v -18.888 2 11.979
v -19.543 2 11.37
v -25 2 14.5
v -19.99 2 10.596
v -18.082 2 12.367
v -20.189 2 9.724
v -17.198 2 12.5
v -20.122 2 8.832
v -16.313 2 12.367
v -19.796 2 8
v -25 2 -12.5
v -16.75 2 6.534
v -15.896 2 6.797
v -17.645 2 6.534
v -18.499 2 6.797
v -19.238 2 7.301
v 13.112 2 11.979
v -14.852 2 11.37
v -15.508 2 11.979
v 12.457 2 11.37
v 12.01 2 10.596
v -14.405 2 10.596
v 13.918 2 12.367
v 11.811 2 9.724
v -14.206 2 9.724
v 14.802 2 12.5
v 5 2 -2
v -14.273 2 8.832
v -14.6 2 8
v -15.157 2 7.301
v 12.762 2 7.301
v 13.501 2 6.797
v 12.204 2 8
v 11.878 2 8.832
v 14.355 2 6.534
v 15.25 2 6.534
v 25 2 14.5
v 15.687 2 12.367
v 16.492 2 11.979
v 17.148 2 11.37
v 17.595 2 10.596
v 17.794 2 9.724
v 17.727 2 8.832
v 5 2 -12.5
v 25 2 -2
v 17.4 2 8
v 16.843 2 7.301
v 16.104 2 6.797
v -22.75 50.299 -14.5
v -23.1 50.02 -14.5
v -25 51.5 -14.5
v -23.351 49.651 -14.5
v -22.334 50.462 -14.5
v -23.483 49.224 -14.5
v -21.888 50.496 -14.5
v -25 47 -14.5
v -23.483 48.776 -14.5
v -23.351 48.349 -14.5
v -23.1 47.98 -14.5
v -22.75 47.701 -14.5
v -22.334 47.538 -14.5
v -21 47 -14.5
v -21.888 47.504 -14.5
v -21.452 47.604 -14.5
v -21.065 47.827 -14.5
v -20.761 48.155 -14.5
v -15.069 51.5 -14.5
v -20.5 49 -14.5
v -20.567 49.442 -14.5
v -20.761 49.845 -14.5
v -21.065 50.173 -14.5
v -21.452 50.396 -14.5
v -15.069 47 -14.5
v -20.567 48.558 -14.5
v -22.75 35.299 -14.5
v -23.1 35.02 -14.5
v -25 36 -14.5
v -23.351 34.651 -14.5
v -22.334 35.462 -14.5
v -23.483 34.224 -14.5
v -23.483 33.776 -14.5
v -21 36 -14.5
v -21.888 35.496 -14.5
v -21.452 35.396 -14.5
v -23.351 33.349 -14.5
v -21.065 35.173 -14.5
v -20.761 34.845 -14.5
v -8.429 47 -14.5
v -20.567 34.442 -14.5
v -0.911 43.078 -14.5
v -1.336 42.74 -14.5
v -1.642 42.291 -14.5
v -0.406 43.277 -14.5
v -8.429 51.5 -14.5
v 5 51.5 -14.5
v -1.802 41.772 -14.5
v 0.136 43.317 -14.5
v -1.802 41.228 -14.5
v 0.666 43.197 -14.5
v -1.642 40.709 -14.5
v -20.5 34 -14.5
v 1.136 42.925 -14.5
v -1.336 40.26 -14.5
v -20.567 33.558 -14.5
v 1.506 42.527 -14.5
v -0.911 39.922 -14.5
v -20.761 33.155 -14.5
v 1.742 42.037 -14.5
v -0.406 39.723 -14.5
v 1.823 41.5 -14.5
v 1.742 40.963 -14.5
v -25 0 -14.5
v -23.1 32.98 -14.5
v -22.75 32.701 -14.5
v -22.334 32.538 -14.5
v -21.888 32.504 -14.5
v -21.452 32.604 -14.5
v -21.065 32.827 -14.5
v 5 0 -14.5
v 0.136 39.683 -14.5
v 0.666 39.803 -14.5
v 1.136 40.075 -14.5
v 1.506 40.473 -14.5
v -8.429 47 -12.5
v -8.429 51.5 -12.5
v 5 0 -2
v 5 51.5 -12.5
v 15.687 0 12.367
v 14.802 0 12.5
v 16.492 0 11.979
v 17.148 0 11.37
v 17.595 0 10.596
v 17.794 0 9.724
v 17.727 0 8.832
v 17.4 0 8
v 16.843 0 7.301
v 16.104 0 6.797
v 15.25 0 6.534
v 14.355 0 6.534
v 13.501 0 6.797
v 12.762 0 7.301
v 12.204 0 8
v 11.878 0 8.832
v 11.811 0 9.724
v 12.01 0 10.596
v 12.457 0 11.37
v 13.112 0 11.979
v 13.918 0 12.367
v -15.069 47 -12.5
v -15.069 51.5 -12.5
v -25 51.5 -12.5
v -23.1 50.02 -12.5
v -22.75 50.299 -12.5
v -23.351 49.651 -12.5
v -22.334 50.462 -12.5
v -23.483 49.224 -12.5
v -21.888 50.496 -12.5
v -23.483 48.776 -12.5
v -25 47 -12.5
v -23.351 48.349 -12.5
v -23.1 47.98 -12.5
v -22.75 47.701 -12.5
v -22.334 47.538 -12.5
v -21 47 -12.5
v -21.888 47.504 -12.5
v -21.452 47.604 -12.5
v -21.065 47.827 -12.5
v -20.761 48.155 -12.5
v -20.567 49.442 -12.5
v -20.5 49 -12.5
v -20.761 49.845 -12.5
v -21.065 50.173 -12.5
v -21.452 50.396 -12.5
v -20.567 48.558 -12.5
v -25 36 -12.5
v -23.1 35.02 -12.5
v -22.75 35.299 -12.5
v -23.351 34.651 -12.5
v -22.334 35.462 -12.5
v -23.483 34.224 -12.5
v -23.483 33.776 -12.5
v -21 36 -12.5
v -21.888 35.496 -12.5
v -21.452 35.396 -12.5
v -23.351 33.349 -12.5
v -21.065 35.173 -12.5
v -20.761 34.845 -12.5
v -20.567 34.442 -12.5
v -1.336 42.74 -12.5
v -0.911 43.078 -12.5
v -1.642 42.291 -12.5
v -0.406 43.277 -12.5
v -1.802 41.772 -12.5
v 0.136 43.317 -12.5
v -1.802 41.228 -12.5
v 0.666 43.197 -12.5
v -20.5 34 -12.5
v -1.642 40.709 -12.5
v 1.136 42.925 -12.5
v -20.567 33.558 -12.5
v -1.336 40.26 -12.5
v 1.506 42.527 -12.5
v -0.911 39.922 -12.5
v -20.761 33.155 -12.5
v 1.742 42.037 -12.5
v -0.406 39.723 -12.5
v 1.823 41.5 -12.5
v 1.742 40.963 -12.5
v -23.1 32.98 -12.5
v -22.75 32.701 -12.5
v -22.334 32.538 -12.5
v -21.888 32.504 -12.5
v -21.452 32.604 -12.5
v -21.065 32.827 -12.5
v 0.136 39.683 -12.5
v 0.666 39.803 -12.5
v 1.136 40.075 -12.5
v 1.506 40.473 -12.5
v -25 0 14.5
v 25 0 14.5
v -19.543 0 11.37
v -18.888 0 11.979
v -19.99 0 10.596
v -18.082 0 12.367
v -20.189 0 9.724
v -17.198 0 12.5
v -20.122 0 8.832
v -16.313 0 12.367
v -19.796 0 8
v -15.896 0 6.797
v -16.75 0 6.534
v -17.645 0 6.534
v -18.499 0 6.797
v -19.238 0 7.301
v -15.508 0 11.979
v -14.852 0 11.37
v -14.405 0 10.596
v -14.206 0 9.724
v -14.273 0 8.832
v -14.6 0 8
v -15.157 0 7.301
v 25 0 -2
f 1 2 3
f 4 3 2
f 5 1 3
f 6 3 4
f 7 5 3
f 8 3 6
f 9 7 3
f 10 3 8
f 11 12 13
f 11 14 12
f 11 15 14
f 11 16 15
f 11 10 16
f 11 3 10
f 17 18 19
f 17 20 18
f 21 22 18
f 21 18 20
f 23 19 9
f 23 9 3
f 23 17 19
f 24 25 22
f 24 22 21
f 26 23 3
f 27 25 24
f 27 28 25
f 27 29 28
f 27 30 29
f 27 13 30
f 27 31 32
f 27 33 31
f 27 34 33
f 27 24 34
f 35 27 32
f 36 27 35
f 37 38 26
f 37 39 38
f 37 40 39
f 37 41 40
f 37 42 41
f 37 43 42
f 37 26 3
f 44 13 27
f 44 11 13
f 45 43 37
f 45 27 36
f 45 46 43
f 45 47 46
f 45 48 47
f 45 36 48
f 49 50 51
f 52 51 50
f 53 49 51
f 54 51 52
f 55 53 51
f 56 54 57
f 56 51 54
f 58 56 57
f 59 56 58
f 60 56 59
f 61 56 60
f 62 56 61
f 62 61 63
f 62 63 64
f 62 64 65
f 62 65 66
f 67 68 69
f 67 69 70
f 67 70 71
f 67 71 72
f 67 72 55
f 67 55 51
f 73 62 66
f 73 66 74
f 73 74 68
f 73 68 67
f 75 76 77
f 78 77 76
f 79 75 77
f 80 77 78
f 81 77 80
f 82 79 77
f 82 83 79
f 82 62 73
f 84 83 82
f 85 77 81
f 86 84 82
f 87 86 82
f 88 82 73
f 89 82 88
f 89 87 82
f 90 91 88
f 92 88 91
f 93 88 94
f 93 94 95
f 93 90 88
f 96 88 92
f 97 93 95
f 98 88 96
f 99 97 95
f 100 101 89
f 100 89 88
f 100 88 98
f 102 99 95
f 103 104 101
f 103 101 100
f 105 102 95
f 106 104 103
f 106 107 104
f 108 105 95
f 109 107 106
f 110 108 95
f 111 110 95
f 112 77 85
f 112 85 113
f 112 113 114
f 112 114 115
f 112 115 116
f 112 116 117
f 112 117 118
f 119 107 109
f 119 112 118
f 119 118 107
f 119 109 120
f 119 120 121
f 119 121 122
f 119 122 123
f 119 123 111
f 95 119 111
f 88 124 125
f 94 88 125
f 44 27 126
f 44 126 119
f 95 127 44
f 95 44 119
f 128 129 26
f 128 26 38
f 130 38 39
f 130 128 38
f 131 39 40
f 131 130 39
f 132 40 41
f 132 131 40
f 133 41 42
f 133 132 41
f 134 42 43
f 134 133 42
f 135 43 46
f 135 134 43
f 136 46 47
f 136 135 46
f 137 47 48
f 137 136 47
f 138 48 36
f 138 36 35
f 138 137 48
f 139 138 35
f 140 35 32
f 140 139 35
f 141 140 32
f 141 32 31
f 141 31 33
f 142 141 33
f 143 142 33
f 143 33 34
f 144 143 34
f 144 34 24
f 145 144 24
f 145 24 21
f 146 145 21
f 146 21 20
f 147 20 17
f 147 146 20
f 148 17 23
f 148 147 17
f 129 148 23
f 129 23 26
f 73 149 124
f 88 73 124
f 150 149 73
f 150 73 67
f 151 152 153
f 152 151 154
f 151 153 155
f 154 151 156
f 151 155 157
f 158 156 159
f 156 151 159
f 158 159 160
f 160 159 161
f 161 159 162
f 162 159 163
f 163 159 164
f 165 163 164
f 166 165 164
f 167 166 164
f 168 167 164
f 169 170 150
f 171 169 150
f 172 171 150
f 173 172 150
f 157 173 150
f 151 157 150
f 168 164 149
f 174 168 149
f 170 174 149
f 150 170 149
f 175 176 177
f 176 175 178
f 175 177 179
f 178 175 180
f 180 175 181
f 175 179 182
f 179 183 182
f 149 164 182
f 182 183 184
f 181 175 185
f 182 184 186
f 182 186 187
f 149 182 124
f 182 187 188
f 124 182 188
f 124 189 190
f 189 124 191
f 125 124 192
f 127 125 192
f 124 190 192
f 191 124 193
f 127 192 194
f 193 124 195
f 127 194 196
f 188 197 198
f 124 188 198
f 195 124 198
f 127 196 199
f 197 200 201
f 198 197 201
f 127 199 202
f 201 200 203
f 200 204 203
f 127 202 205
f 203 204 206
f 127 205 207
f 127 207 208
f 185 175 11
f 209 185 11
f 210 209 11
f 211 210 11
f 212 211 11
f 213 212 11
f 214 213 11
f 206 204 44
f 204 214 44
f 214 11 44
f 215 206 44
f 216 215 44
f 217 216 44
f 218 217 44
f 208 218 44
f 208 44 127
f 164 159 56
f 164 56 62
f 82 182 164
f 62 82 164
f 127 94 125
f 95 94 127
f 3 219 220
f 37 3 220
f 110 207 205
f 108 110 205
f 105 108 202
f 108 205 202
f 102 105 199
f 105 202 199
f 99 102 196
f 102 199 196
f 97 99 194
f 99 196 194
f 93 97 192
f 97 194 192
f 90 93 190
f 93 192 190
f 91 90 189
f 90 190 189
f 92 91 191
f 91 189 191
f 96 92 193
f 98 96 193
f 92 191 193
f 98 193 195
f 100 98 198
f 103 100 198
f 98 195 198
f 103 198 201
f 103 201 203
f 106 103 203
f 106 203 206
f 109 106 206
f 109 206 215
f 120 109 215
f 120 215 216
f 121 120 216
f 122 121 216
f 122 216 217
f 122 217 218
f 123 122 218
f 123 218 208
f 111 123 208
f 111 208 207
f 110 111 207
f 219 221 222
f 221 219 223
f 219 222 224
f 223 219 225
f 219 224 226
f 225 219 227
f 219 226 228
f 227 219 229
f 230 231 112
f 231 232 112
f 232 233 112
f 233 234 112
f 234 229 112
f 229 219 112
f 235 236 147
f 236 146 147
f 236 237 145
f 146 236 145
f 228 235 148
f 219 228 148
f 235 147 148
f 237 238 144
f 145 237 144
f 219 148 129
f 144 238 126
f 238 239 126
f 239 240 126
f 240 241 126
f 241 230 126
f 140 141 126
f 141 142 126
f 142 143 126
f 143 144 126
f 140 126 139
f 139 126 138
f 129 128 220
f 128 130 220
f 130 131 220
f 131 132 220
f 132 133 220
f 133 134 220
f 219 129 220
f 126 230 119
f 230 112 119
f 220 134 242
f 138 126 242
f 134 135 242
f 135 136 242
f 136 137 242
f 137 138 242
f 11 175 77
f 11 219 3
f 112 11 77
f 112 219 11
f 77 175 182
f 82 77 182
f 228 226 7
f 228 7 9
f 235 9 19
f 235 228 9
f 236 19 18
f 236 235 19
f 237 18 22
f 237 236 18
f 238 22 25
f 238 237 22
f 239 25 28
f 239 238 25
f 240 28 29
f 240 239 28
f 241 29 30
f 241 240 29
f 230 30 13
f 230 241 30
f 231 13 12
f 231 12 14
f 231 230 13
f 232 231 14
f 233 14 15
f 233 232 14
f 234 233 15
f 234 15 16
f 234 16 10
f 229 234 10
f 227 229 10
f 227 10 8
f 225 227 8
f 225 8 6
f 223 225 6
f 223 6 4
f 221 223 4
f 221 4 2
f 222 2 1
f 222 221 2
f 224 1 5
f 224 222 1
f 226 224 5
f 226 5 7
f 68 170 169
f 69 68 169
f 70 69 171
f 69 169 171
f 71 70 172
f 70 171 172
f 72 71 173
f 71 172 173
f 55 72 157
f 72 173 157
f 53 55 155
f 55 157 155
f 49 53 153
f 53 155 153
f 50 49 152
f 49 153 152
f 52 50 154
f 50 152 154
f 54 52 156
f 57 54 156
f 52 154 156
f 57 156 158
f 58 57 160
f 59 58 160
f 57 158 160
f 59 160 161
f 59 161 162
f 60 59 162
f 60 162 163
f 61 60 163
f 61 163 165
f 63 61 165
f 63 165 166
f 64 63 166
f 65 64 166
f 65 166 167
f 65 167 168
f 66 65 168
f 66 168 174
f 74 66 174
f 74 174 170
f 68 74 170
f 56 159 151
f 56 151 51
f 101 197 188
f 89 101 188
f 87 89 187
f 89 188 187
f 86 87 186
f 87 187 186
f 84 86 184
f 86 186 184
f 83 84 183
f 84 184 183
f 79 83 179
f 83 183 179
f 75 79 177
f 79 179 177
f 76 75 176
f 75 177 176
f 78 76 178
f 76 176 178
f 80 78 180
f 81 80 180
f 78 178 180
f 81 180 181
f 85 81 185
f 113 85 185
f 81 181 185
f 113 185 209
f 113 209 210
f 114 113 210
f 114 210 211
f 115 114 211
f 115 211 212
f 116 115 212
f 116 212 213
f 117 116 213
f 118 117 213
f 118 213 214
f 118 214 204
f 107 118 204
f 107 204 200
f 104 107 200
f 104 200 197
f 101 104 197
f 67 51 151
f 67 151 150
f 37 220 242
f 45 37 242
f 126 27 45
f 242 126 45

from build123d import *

# Parameters (mm, degrees)
SKIZZE1_W                       = 50
SKIZZE1_H                       = 29
SKIZZE1_R                       = 3
AUFSATZ_LINEAR_AUSTRAGEN1_DEPTH = 2
SKIZZE2_W                       = 30
SKIZZE2_H                       = 2
AUFSATZ_LINEAR_AUSTRAGEN2_DEPTH = 49.5
SKIZZE3_R                       = 1.5
SKIZZE3_R_2                     = 1.822550398
SKIZZE3_W                       = 4
SKIZZE3_H                       = 11
SKIZZE3_W_2                     = 6.639290737
SKIZZE3_H_2                     = 4.5
SCHNITT_LINEAR_AUSTRAGEN1_DEPTH = 49.5
SKIZZE4_W                       = 20
SKIZZE4_H                       = 12.5
SCHNITT_LINEAR_AUSTRAGEN2_DEPTH = 49.5


with BuildPart() as part:
    # Skizze1 → Aufsatz-Linear austragen1 (new body)
    with BuildSketch(Plane(origin=(0, 0, 0), x_dir=(1, 0, 0), z_dir=(0, 1, 0))):
        Rectangle(SKIZZE1_W, SKIZZE1_H)
        with Locations(Location((14.802393345, -9.5, 0), (0, 0, 270))):
            Circle(SKIZZE1_R, mode=Mode.SUBTRACT)
        with Locations(Location((-17.197606655, -9.5, 0), (0, 0, 270))):
            Circle(SKIZZE1_R, mode=Mode.SUBTRACT)
    extrude(amount=AUFSATZ_LINEAR_AUSTRAGEN1_DEPTH)

    # Skizze2 → Aufsatz-Linear austragen2 (add)
    with BuildSketch(Plane(origin=(0, 2, 0), x_dir=(1, 0, 0), z_dir=(0, 1, 0))):
        with Locations((-10, 13.5)):
            Rectangle(SKIZZE2_W, SKIZZE2_H)
    extrude(amount=AUFSATZ_LINEAR_AUSTRAGEN2_DEPTH)

    # Skizze3 → Schnitt-Linear austragen1 (cut)
    with BuildSketch(Plane.XY.offset(-12.5)):
        with Locations((-22, 49)):
            Circle(SKIZZE3_R)
        with Locations((-22, 34)):
            Circle(SKIZZE3_R)
        with Locations((0, 41.5)):
            Circle(SKIZZE3_R_2)
        with Locations((-23, 41.5)):
            Rectangle(SKIZZE3_W, SKIZZE3_H)
        with Locations((-11.748940962, 49.25)):
            Rectangle(SKIZZE3_W_2, SKIZZE3_H_2)
    extrude(amount=-SCHNITT_LINEAR_AUSTRAGEN1_DEPTH, mode=Mode.SUBTRACT)

    # Skizze4 → Schnitt-Linear austragen2 (cut)
    with BuildSketch(Plane(origin=(0, 2, 0), x_dir=(1, 0, 0), z_dir=(0, 1, 0))):
        with Locations((15, 8.25)):
            Rectangle(SKIZZE4_W, SKIZZE4_H)
    extrude(amount=-SCHNITT_LINEAR_AUSTRAGEN2_DEPTH, mode=Mode.SUBTRACT)


solid = part.part
